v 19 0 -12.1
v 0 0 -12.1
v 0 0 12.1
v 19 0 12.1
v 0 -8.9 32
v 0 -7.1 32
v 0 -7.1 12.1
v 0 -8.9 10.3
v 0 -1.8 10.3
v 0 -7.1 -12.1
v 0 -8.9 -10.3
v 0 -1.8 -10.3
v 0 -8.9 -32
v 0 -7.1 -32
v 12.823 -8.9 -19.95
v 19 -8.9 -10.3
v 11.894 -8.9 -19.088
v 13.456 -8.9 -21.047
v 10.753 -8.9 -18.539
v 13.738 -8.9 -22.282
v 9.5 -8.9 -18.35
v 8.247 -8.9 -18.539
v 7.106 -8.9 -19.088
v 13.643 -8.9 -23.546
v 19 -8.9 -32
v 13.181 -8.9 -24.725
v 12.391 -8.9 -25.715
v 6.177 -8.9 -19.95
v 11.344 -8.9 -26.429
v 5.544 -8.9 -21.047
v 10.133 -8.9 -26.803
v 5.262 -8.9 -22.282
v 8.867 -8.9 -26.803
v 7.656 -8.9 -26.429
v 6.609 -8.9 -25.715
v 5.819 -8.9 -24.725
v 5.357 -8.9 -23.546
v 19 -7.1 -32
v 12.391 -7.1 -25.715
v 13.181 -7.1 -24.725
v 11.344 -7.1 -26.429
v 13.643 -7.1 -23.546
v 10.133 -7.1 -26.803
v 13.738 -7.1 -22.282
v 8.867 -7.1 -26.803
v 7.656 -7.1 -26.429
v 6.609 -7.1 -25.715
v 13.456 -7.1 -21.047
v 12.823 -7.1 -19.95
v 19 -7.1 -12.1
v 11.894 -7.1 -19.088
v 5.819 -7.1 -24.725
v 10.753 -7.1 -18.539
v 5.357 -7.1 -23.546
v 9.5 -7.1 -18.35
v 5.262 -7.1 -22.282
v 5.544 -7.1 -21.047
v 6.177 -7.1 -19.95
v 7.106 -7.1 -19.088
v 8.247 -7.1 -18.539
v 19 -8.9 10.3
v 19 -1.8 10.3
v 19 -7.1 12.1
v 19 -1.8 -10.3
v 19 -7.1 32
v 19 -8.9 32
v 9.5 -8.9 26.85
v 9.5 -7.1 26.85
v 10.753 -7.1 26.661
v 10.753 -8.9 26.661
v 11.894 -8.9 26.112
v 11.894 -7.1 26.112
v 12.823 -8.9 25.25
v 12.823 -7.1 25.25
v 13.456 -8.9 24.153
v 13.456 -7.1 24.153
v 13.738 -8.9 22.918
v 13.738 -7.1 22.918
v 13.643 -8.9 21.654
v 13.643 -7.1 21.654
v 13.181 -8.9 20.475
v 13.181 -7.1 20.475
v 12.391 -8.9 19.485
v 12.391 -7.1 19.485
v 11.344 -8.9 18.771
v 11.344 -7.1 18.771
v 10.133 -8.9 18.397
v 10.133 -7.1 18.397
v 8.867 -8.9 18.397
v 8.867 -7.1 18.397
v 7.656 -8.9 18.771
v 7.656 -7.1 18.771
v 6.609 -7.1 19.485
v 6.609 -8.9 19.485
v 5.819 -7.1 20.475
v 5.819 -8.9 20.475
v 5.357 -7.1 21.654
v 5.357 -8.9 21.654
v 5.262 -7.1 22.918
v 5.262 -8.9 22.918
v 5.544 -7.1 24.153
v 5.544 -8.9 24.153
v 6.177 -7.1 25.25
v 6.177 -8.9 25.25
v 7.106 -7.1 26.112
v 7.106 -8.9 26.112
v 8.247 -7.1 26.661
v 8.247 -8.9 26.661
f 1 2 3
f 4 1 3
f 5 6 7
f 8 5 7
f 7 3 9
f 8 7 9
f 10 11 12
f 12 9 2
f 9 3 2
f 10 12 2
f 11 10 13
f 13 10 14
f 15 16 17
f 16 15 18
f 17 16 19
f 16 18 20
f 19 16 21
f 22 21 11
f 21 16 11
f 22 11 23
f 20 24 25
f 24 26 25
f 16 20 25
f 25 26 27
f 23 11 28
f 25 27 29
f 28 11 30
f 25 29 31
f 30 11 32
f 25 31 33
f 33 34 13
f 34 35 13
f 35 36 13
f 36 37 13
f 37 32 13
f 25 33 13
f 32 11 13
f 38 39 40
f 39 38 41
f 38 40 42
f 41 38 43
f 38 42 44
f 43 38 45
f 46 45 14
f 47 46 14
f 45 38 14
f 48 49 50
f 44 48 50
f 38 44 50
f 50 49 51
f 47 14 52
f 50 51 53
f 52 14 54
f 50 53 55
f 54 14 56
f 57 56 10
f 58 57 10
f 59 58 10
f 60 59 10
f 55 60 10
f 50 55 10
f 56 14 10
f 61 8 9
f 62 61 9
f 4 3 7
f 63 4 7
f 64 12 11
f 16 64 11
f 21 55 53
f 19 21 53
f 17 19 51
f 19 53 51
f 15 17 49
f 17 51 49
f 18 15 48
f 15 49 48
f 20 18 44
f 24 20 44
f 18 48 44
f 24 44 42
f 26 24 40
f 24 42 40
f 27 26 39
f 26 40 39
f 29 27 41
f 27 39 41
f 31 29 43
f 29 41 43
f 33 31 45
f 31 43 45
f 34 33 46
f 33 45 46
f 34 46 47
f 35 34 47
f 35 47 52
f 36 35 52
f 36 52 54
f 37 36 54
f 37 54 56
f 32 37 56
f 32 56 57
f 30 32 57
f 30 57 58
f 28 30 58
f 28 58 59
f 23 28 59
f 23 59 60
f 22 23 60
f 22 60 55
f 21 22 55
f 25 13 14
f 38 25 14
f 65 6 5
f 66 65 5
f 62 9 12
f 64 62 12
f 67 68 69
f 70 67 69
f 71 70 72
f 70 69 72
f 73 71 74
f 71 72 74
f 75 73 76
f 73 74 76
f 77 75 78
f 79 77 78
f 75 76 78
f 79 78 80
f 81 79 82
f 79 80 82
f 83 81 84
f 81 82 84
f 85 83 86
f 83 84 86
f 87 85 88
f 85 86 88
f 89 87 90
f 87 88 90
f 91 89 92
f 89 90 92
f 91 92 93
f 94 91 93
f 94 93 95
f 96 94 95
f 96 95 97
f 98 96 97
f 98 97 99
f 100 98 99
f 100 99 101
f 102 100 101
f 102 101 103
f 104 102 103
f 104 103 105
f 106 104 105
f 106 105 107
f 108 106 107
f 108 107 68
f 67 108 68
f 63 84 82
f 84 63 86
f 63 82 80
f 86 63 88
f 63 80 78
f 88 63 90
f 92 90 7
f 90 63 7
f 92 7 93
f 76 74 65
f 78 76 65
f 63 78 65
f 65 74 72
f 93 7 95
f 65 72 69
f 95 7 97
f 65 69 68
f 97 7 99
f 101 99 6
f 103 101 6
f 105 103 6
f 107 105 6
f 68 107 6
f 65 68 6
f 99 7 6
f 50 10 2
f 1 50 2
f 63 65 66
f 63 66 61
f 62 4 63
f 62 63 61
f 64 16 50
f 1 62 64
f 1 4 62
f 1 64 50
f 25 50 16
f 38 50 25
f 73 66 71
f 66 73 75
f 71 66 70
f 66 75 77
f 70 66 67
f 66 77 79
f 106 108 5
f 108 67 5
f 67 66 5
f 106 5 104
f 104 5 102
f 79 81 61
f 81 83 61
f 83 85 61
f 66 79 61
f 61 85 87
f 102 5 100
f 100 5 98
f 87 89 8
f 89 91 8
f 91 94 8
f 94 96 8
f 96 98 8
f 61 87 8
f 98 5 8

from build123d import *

# Parameters (mm, degrees)
EXTRUDE_5_DEPTH     = 19
SKETCH_6_R          = 4.25
CUT_EXTRUDE_1_DEPTH = 19


with BuildPart() as part:
    # 草图5 → 凸台-拉伸5 (new body)
    with BuildSketch(Plane(origin=(0, 0, 0), x_dir=(0, 0, -1), z_dir=(1, 0, 0))):
        Polygon((12.1, 0), (-12.1, 0), (-12.1, -7.1), (-32, -7.1), (-32, -8.9), (-10.3, -8.9), (-10.3, -1.8), (10.3, -1.8), (10.3, -8.9), (32, -8.9), (32, -7.1), (12.1, -7.1), align=None)
    extrude(amount=EXTRUDE_5_DEPTH)

    # 草图6 → 切除-拉伸1 (cut)
    with BuildSketch(Plane(origin=(0, -7.1, 0), x_dir=(1, 0, 0), z_dir=(0, 1, 0))):
        with Locations(Location((9.5, -22.6, 0), (0, 0, 270))):
            Circle(SKETCH_6_R)
        with Locations(Location((9.5, 22.6, 0), (0, 0, 270))):
            Circle(SKETCH_6_R)
    extrude(amount=-CUT_EXTRUDE_1_DEPTH, mode=Mode.SUBTRACT)


solid = part.part
